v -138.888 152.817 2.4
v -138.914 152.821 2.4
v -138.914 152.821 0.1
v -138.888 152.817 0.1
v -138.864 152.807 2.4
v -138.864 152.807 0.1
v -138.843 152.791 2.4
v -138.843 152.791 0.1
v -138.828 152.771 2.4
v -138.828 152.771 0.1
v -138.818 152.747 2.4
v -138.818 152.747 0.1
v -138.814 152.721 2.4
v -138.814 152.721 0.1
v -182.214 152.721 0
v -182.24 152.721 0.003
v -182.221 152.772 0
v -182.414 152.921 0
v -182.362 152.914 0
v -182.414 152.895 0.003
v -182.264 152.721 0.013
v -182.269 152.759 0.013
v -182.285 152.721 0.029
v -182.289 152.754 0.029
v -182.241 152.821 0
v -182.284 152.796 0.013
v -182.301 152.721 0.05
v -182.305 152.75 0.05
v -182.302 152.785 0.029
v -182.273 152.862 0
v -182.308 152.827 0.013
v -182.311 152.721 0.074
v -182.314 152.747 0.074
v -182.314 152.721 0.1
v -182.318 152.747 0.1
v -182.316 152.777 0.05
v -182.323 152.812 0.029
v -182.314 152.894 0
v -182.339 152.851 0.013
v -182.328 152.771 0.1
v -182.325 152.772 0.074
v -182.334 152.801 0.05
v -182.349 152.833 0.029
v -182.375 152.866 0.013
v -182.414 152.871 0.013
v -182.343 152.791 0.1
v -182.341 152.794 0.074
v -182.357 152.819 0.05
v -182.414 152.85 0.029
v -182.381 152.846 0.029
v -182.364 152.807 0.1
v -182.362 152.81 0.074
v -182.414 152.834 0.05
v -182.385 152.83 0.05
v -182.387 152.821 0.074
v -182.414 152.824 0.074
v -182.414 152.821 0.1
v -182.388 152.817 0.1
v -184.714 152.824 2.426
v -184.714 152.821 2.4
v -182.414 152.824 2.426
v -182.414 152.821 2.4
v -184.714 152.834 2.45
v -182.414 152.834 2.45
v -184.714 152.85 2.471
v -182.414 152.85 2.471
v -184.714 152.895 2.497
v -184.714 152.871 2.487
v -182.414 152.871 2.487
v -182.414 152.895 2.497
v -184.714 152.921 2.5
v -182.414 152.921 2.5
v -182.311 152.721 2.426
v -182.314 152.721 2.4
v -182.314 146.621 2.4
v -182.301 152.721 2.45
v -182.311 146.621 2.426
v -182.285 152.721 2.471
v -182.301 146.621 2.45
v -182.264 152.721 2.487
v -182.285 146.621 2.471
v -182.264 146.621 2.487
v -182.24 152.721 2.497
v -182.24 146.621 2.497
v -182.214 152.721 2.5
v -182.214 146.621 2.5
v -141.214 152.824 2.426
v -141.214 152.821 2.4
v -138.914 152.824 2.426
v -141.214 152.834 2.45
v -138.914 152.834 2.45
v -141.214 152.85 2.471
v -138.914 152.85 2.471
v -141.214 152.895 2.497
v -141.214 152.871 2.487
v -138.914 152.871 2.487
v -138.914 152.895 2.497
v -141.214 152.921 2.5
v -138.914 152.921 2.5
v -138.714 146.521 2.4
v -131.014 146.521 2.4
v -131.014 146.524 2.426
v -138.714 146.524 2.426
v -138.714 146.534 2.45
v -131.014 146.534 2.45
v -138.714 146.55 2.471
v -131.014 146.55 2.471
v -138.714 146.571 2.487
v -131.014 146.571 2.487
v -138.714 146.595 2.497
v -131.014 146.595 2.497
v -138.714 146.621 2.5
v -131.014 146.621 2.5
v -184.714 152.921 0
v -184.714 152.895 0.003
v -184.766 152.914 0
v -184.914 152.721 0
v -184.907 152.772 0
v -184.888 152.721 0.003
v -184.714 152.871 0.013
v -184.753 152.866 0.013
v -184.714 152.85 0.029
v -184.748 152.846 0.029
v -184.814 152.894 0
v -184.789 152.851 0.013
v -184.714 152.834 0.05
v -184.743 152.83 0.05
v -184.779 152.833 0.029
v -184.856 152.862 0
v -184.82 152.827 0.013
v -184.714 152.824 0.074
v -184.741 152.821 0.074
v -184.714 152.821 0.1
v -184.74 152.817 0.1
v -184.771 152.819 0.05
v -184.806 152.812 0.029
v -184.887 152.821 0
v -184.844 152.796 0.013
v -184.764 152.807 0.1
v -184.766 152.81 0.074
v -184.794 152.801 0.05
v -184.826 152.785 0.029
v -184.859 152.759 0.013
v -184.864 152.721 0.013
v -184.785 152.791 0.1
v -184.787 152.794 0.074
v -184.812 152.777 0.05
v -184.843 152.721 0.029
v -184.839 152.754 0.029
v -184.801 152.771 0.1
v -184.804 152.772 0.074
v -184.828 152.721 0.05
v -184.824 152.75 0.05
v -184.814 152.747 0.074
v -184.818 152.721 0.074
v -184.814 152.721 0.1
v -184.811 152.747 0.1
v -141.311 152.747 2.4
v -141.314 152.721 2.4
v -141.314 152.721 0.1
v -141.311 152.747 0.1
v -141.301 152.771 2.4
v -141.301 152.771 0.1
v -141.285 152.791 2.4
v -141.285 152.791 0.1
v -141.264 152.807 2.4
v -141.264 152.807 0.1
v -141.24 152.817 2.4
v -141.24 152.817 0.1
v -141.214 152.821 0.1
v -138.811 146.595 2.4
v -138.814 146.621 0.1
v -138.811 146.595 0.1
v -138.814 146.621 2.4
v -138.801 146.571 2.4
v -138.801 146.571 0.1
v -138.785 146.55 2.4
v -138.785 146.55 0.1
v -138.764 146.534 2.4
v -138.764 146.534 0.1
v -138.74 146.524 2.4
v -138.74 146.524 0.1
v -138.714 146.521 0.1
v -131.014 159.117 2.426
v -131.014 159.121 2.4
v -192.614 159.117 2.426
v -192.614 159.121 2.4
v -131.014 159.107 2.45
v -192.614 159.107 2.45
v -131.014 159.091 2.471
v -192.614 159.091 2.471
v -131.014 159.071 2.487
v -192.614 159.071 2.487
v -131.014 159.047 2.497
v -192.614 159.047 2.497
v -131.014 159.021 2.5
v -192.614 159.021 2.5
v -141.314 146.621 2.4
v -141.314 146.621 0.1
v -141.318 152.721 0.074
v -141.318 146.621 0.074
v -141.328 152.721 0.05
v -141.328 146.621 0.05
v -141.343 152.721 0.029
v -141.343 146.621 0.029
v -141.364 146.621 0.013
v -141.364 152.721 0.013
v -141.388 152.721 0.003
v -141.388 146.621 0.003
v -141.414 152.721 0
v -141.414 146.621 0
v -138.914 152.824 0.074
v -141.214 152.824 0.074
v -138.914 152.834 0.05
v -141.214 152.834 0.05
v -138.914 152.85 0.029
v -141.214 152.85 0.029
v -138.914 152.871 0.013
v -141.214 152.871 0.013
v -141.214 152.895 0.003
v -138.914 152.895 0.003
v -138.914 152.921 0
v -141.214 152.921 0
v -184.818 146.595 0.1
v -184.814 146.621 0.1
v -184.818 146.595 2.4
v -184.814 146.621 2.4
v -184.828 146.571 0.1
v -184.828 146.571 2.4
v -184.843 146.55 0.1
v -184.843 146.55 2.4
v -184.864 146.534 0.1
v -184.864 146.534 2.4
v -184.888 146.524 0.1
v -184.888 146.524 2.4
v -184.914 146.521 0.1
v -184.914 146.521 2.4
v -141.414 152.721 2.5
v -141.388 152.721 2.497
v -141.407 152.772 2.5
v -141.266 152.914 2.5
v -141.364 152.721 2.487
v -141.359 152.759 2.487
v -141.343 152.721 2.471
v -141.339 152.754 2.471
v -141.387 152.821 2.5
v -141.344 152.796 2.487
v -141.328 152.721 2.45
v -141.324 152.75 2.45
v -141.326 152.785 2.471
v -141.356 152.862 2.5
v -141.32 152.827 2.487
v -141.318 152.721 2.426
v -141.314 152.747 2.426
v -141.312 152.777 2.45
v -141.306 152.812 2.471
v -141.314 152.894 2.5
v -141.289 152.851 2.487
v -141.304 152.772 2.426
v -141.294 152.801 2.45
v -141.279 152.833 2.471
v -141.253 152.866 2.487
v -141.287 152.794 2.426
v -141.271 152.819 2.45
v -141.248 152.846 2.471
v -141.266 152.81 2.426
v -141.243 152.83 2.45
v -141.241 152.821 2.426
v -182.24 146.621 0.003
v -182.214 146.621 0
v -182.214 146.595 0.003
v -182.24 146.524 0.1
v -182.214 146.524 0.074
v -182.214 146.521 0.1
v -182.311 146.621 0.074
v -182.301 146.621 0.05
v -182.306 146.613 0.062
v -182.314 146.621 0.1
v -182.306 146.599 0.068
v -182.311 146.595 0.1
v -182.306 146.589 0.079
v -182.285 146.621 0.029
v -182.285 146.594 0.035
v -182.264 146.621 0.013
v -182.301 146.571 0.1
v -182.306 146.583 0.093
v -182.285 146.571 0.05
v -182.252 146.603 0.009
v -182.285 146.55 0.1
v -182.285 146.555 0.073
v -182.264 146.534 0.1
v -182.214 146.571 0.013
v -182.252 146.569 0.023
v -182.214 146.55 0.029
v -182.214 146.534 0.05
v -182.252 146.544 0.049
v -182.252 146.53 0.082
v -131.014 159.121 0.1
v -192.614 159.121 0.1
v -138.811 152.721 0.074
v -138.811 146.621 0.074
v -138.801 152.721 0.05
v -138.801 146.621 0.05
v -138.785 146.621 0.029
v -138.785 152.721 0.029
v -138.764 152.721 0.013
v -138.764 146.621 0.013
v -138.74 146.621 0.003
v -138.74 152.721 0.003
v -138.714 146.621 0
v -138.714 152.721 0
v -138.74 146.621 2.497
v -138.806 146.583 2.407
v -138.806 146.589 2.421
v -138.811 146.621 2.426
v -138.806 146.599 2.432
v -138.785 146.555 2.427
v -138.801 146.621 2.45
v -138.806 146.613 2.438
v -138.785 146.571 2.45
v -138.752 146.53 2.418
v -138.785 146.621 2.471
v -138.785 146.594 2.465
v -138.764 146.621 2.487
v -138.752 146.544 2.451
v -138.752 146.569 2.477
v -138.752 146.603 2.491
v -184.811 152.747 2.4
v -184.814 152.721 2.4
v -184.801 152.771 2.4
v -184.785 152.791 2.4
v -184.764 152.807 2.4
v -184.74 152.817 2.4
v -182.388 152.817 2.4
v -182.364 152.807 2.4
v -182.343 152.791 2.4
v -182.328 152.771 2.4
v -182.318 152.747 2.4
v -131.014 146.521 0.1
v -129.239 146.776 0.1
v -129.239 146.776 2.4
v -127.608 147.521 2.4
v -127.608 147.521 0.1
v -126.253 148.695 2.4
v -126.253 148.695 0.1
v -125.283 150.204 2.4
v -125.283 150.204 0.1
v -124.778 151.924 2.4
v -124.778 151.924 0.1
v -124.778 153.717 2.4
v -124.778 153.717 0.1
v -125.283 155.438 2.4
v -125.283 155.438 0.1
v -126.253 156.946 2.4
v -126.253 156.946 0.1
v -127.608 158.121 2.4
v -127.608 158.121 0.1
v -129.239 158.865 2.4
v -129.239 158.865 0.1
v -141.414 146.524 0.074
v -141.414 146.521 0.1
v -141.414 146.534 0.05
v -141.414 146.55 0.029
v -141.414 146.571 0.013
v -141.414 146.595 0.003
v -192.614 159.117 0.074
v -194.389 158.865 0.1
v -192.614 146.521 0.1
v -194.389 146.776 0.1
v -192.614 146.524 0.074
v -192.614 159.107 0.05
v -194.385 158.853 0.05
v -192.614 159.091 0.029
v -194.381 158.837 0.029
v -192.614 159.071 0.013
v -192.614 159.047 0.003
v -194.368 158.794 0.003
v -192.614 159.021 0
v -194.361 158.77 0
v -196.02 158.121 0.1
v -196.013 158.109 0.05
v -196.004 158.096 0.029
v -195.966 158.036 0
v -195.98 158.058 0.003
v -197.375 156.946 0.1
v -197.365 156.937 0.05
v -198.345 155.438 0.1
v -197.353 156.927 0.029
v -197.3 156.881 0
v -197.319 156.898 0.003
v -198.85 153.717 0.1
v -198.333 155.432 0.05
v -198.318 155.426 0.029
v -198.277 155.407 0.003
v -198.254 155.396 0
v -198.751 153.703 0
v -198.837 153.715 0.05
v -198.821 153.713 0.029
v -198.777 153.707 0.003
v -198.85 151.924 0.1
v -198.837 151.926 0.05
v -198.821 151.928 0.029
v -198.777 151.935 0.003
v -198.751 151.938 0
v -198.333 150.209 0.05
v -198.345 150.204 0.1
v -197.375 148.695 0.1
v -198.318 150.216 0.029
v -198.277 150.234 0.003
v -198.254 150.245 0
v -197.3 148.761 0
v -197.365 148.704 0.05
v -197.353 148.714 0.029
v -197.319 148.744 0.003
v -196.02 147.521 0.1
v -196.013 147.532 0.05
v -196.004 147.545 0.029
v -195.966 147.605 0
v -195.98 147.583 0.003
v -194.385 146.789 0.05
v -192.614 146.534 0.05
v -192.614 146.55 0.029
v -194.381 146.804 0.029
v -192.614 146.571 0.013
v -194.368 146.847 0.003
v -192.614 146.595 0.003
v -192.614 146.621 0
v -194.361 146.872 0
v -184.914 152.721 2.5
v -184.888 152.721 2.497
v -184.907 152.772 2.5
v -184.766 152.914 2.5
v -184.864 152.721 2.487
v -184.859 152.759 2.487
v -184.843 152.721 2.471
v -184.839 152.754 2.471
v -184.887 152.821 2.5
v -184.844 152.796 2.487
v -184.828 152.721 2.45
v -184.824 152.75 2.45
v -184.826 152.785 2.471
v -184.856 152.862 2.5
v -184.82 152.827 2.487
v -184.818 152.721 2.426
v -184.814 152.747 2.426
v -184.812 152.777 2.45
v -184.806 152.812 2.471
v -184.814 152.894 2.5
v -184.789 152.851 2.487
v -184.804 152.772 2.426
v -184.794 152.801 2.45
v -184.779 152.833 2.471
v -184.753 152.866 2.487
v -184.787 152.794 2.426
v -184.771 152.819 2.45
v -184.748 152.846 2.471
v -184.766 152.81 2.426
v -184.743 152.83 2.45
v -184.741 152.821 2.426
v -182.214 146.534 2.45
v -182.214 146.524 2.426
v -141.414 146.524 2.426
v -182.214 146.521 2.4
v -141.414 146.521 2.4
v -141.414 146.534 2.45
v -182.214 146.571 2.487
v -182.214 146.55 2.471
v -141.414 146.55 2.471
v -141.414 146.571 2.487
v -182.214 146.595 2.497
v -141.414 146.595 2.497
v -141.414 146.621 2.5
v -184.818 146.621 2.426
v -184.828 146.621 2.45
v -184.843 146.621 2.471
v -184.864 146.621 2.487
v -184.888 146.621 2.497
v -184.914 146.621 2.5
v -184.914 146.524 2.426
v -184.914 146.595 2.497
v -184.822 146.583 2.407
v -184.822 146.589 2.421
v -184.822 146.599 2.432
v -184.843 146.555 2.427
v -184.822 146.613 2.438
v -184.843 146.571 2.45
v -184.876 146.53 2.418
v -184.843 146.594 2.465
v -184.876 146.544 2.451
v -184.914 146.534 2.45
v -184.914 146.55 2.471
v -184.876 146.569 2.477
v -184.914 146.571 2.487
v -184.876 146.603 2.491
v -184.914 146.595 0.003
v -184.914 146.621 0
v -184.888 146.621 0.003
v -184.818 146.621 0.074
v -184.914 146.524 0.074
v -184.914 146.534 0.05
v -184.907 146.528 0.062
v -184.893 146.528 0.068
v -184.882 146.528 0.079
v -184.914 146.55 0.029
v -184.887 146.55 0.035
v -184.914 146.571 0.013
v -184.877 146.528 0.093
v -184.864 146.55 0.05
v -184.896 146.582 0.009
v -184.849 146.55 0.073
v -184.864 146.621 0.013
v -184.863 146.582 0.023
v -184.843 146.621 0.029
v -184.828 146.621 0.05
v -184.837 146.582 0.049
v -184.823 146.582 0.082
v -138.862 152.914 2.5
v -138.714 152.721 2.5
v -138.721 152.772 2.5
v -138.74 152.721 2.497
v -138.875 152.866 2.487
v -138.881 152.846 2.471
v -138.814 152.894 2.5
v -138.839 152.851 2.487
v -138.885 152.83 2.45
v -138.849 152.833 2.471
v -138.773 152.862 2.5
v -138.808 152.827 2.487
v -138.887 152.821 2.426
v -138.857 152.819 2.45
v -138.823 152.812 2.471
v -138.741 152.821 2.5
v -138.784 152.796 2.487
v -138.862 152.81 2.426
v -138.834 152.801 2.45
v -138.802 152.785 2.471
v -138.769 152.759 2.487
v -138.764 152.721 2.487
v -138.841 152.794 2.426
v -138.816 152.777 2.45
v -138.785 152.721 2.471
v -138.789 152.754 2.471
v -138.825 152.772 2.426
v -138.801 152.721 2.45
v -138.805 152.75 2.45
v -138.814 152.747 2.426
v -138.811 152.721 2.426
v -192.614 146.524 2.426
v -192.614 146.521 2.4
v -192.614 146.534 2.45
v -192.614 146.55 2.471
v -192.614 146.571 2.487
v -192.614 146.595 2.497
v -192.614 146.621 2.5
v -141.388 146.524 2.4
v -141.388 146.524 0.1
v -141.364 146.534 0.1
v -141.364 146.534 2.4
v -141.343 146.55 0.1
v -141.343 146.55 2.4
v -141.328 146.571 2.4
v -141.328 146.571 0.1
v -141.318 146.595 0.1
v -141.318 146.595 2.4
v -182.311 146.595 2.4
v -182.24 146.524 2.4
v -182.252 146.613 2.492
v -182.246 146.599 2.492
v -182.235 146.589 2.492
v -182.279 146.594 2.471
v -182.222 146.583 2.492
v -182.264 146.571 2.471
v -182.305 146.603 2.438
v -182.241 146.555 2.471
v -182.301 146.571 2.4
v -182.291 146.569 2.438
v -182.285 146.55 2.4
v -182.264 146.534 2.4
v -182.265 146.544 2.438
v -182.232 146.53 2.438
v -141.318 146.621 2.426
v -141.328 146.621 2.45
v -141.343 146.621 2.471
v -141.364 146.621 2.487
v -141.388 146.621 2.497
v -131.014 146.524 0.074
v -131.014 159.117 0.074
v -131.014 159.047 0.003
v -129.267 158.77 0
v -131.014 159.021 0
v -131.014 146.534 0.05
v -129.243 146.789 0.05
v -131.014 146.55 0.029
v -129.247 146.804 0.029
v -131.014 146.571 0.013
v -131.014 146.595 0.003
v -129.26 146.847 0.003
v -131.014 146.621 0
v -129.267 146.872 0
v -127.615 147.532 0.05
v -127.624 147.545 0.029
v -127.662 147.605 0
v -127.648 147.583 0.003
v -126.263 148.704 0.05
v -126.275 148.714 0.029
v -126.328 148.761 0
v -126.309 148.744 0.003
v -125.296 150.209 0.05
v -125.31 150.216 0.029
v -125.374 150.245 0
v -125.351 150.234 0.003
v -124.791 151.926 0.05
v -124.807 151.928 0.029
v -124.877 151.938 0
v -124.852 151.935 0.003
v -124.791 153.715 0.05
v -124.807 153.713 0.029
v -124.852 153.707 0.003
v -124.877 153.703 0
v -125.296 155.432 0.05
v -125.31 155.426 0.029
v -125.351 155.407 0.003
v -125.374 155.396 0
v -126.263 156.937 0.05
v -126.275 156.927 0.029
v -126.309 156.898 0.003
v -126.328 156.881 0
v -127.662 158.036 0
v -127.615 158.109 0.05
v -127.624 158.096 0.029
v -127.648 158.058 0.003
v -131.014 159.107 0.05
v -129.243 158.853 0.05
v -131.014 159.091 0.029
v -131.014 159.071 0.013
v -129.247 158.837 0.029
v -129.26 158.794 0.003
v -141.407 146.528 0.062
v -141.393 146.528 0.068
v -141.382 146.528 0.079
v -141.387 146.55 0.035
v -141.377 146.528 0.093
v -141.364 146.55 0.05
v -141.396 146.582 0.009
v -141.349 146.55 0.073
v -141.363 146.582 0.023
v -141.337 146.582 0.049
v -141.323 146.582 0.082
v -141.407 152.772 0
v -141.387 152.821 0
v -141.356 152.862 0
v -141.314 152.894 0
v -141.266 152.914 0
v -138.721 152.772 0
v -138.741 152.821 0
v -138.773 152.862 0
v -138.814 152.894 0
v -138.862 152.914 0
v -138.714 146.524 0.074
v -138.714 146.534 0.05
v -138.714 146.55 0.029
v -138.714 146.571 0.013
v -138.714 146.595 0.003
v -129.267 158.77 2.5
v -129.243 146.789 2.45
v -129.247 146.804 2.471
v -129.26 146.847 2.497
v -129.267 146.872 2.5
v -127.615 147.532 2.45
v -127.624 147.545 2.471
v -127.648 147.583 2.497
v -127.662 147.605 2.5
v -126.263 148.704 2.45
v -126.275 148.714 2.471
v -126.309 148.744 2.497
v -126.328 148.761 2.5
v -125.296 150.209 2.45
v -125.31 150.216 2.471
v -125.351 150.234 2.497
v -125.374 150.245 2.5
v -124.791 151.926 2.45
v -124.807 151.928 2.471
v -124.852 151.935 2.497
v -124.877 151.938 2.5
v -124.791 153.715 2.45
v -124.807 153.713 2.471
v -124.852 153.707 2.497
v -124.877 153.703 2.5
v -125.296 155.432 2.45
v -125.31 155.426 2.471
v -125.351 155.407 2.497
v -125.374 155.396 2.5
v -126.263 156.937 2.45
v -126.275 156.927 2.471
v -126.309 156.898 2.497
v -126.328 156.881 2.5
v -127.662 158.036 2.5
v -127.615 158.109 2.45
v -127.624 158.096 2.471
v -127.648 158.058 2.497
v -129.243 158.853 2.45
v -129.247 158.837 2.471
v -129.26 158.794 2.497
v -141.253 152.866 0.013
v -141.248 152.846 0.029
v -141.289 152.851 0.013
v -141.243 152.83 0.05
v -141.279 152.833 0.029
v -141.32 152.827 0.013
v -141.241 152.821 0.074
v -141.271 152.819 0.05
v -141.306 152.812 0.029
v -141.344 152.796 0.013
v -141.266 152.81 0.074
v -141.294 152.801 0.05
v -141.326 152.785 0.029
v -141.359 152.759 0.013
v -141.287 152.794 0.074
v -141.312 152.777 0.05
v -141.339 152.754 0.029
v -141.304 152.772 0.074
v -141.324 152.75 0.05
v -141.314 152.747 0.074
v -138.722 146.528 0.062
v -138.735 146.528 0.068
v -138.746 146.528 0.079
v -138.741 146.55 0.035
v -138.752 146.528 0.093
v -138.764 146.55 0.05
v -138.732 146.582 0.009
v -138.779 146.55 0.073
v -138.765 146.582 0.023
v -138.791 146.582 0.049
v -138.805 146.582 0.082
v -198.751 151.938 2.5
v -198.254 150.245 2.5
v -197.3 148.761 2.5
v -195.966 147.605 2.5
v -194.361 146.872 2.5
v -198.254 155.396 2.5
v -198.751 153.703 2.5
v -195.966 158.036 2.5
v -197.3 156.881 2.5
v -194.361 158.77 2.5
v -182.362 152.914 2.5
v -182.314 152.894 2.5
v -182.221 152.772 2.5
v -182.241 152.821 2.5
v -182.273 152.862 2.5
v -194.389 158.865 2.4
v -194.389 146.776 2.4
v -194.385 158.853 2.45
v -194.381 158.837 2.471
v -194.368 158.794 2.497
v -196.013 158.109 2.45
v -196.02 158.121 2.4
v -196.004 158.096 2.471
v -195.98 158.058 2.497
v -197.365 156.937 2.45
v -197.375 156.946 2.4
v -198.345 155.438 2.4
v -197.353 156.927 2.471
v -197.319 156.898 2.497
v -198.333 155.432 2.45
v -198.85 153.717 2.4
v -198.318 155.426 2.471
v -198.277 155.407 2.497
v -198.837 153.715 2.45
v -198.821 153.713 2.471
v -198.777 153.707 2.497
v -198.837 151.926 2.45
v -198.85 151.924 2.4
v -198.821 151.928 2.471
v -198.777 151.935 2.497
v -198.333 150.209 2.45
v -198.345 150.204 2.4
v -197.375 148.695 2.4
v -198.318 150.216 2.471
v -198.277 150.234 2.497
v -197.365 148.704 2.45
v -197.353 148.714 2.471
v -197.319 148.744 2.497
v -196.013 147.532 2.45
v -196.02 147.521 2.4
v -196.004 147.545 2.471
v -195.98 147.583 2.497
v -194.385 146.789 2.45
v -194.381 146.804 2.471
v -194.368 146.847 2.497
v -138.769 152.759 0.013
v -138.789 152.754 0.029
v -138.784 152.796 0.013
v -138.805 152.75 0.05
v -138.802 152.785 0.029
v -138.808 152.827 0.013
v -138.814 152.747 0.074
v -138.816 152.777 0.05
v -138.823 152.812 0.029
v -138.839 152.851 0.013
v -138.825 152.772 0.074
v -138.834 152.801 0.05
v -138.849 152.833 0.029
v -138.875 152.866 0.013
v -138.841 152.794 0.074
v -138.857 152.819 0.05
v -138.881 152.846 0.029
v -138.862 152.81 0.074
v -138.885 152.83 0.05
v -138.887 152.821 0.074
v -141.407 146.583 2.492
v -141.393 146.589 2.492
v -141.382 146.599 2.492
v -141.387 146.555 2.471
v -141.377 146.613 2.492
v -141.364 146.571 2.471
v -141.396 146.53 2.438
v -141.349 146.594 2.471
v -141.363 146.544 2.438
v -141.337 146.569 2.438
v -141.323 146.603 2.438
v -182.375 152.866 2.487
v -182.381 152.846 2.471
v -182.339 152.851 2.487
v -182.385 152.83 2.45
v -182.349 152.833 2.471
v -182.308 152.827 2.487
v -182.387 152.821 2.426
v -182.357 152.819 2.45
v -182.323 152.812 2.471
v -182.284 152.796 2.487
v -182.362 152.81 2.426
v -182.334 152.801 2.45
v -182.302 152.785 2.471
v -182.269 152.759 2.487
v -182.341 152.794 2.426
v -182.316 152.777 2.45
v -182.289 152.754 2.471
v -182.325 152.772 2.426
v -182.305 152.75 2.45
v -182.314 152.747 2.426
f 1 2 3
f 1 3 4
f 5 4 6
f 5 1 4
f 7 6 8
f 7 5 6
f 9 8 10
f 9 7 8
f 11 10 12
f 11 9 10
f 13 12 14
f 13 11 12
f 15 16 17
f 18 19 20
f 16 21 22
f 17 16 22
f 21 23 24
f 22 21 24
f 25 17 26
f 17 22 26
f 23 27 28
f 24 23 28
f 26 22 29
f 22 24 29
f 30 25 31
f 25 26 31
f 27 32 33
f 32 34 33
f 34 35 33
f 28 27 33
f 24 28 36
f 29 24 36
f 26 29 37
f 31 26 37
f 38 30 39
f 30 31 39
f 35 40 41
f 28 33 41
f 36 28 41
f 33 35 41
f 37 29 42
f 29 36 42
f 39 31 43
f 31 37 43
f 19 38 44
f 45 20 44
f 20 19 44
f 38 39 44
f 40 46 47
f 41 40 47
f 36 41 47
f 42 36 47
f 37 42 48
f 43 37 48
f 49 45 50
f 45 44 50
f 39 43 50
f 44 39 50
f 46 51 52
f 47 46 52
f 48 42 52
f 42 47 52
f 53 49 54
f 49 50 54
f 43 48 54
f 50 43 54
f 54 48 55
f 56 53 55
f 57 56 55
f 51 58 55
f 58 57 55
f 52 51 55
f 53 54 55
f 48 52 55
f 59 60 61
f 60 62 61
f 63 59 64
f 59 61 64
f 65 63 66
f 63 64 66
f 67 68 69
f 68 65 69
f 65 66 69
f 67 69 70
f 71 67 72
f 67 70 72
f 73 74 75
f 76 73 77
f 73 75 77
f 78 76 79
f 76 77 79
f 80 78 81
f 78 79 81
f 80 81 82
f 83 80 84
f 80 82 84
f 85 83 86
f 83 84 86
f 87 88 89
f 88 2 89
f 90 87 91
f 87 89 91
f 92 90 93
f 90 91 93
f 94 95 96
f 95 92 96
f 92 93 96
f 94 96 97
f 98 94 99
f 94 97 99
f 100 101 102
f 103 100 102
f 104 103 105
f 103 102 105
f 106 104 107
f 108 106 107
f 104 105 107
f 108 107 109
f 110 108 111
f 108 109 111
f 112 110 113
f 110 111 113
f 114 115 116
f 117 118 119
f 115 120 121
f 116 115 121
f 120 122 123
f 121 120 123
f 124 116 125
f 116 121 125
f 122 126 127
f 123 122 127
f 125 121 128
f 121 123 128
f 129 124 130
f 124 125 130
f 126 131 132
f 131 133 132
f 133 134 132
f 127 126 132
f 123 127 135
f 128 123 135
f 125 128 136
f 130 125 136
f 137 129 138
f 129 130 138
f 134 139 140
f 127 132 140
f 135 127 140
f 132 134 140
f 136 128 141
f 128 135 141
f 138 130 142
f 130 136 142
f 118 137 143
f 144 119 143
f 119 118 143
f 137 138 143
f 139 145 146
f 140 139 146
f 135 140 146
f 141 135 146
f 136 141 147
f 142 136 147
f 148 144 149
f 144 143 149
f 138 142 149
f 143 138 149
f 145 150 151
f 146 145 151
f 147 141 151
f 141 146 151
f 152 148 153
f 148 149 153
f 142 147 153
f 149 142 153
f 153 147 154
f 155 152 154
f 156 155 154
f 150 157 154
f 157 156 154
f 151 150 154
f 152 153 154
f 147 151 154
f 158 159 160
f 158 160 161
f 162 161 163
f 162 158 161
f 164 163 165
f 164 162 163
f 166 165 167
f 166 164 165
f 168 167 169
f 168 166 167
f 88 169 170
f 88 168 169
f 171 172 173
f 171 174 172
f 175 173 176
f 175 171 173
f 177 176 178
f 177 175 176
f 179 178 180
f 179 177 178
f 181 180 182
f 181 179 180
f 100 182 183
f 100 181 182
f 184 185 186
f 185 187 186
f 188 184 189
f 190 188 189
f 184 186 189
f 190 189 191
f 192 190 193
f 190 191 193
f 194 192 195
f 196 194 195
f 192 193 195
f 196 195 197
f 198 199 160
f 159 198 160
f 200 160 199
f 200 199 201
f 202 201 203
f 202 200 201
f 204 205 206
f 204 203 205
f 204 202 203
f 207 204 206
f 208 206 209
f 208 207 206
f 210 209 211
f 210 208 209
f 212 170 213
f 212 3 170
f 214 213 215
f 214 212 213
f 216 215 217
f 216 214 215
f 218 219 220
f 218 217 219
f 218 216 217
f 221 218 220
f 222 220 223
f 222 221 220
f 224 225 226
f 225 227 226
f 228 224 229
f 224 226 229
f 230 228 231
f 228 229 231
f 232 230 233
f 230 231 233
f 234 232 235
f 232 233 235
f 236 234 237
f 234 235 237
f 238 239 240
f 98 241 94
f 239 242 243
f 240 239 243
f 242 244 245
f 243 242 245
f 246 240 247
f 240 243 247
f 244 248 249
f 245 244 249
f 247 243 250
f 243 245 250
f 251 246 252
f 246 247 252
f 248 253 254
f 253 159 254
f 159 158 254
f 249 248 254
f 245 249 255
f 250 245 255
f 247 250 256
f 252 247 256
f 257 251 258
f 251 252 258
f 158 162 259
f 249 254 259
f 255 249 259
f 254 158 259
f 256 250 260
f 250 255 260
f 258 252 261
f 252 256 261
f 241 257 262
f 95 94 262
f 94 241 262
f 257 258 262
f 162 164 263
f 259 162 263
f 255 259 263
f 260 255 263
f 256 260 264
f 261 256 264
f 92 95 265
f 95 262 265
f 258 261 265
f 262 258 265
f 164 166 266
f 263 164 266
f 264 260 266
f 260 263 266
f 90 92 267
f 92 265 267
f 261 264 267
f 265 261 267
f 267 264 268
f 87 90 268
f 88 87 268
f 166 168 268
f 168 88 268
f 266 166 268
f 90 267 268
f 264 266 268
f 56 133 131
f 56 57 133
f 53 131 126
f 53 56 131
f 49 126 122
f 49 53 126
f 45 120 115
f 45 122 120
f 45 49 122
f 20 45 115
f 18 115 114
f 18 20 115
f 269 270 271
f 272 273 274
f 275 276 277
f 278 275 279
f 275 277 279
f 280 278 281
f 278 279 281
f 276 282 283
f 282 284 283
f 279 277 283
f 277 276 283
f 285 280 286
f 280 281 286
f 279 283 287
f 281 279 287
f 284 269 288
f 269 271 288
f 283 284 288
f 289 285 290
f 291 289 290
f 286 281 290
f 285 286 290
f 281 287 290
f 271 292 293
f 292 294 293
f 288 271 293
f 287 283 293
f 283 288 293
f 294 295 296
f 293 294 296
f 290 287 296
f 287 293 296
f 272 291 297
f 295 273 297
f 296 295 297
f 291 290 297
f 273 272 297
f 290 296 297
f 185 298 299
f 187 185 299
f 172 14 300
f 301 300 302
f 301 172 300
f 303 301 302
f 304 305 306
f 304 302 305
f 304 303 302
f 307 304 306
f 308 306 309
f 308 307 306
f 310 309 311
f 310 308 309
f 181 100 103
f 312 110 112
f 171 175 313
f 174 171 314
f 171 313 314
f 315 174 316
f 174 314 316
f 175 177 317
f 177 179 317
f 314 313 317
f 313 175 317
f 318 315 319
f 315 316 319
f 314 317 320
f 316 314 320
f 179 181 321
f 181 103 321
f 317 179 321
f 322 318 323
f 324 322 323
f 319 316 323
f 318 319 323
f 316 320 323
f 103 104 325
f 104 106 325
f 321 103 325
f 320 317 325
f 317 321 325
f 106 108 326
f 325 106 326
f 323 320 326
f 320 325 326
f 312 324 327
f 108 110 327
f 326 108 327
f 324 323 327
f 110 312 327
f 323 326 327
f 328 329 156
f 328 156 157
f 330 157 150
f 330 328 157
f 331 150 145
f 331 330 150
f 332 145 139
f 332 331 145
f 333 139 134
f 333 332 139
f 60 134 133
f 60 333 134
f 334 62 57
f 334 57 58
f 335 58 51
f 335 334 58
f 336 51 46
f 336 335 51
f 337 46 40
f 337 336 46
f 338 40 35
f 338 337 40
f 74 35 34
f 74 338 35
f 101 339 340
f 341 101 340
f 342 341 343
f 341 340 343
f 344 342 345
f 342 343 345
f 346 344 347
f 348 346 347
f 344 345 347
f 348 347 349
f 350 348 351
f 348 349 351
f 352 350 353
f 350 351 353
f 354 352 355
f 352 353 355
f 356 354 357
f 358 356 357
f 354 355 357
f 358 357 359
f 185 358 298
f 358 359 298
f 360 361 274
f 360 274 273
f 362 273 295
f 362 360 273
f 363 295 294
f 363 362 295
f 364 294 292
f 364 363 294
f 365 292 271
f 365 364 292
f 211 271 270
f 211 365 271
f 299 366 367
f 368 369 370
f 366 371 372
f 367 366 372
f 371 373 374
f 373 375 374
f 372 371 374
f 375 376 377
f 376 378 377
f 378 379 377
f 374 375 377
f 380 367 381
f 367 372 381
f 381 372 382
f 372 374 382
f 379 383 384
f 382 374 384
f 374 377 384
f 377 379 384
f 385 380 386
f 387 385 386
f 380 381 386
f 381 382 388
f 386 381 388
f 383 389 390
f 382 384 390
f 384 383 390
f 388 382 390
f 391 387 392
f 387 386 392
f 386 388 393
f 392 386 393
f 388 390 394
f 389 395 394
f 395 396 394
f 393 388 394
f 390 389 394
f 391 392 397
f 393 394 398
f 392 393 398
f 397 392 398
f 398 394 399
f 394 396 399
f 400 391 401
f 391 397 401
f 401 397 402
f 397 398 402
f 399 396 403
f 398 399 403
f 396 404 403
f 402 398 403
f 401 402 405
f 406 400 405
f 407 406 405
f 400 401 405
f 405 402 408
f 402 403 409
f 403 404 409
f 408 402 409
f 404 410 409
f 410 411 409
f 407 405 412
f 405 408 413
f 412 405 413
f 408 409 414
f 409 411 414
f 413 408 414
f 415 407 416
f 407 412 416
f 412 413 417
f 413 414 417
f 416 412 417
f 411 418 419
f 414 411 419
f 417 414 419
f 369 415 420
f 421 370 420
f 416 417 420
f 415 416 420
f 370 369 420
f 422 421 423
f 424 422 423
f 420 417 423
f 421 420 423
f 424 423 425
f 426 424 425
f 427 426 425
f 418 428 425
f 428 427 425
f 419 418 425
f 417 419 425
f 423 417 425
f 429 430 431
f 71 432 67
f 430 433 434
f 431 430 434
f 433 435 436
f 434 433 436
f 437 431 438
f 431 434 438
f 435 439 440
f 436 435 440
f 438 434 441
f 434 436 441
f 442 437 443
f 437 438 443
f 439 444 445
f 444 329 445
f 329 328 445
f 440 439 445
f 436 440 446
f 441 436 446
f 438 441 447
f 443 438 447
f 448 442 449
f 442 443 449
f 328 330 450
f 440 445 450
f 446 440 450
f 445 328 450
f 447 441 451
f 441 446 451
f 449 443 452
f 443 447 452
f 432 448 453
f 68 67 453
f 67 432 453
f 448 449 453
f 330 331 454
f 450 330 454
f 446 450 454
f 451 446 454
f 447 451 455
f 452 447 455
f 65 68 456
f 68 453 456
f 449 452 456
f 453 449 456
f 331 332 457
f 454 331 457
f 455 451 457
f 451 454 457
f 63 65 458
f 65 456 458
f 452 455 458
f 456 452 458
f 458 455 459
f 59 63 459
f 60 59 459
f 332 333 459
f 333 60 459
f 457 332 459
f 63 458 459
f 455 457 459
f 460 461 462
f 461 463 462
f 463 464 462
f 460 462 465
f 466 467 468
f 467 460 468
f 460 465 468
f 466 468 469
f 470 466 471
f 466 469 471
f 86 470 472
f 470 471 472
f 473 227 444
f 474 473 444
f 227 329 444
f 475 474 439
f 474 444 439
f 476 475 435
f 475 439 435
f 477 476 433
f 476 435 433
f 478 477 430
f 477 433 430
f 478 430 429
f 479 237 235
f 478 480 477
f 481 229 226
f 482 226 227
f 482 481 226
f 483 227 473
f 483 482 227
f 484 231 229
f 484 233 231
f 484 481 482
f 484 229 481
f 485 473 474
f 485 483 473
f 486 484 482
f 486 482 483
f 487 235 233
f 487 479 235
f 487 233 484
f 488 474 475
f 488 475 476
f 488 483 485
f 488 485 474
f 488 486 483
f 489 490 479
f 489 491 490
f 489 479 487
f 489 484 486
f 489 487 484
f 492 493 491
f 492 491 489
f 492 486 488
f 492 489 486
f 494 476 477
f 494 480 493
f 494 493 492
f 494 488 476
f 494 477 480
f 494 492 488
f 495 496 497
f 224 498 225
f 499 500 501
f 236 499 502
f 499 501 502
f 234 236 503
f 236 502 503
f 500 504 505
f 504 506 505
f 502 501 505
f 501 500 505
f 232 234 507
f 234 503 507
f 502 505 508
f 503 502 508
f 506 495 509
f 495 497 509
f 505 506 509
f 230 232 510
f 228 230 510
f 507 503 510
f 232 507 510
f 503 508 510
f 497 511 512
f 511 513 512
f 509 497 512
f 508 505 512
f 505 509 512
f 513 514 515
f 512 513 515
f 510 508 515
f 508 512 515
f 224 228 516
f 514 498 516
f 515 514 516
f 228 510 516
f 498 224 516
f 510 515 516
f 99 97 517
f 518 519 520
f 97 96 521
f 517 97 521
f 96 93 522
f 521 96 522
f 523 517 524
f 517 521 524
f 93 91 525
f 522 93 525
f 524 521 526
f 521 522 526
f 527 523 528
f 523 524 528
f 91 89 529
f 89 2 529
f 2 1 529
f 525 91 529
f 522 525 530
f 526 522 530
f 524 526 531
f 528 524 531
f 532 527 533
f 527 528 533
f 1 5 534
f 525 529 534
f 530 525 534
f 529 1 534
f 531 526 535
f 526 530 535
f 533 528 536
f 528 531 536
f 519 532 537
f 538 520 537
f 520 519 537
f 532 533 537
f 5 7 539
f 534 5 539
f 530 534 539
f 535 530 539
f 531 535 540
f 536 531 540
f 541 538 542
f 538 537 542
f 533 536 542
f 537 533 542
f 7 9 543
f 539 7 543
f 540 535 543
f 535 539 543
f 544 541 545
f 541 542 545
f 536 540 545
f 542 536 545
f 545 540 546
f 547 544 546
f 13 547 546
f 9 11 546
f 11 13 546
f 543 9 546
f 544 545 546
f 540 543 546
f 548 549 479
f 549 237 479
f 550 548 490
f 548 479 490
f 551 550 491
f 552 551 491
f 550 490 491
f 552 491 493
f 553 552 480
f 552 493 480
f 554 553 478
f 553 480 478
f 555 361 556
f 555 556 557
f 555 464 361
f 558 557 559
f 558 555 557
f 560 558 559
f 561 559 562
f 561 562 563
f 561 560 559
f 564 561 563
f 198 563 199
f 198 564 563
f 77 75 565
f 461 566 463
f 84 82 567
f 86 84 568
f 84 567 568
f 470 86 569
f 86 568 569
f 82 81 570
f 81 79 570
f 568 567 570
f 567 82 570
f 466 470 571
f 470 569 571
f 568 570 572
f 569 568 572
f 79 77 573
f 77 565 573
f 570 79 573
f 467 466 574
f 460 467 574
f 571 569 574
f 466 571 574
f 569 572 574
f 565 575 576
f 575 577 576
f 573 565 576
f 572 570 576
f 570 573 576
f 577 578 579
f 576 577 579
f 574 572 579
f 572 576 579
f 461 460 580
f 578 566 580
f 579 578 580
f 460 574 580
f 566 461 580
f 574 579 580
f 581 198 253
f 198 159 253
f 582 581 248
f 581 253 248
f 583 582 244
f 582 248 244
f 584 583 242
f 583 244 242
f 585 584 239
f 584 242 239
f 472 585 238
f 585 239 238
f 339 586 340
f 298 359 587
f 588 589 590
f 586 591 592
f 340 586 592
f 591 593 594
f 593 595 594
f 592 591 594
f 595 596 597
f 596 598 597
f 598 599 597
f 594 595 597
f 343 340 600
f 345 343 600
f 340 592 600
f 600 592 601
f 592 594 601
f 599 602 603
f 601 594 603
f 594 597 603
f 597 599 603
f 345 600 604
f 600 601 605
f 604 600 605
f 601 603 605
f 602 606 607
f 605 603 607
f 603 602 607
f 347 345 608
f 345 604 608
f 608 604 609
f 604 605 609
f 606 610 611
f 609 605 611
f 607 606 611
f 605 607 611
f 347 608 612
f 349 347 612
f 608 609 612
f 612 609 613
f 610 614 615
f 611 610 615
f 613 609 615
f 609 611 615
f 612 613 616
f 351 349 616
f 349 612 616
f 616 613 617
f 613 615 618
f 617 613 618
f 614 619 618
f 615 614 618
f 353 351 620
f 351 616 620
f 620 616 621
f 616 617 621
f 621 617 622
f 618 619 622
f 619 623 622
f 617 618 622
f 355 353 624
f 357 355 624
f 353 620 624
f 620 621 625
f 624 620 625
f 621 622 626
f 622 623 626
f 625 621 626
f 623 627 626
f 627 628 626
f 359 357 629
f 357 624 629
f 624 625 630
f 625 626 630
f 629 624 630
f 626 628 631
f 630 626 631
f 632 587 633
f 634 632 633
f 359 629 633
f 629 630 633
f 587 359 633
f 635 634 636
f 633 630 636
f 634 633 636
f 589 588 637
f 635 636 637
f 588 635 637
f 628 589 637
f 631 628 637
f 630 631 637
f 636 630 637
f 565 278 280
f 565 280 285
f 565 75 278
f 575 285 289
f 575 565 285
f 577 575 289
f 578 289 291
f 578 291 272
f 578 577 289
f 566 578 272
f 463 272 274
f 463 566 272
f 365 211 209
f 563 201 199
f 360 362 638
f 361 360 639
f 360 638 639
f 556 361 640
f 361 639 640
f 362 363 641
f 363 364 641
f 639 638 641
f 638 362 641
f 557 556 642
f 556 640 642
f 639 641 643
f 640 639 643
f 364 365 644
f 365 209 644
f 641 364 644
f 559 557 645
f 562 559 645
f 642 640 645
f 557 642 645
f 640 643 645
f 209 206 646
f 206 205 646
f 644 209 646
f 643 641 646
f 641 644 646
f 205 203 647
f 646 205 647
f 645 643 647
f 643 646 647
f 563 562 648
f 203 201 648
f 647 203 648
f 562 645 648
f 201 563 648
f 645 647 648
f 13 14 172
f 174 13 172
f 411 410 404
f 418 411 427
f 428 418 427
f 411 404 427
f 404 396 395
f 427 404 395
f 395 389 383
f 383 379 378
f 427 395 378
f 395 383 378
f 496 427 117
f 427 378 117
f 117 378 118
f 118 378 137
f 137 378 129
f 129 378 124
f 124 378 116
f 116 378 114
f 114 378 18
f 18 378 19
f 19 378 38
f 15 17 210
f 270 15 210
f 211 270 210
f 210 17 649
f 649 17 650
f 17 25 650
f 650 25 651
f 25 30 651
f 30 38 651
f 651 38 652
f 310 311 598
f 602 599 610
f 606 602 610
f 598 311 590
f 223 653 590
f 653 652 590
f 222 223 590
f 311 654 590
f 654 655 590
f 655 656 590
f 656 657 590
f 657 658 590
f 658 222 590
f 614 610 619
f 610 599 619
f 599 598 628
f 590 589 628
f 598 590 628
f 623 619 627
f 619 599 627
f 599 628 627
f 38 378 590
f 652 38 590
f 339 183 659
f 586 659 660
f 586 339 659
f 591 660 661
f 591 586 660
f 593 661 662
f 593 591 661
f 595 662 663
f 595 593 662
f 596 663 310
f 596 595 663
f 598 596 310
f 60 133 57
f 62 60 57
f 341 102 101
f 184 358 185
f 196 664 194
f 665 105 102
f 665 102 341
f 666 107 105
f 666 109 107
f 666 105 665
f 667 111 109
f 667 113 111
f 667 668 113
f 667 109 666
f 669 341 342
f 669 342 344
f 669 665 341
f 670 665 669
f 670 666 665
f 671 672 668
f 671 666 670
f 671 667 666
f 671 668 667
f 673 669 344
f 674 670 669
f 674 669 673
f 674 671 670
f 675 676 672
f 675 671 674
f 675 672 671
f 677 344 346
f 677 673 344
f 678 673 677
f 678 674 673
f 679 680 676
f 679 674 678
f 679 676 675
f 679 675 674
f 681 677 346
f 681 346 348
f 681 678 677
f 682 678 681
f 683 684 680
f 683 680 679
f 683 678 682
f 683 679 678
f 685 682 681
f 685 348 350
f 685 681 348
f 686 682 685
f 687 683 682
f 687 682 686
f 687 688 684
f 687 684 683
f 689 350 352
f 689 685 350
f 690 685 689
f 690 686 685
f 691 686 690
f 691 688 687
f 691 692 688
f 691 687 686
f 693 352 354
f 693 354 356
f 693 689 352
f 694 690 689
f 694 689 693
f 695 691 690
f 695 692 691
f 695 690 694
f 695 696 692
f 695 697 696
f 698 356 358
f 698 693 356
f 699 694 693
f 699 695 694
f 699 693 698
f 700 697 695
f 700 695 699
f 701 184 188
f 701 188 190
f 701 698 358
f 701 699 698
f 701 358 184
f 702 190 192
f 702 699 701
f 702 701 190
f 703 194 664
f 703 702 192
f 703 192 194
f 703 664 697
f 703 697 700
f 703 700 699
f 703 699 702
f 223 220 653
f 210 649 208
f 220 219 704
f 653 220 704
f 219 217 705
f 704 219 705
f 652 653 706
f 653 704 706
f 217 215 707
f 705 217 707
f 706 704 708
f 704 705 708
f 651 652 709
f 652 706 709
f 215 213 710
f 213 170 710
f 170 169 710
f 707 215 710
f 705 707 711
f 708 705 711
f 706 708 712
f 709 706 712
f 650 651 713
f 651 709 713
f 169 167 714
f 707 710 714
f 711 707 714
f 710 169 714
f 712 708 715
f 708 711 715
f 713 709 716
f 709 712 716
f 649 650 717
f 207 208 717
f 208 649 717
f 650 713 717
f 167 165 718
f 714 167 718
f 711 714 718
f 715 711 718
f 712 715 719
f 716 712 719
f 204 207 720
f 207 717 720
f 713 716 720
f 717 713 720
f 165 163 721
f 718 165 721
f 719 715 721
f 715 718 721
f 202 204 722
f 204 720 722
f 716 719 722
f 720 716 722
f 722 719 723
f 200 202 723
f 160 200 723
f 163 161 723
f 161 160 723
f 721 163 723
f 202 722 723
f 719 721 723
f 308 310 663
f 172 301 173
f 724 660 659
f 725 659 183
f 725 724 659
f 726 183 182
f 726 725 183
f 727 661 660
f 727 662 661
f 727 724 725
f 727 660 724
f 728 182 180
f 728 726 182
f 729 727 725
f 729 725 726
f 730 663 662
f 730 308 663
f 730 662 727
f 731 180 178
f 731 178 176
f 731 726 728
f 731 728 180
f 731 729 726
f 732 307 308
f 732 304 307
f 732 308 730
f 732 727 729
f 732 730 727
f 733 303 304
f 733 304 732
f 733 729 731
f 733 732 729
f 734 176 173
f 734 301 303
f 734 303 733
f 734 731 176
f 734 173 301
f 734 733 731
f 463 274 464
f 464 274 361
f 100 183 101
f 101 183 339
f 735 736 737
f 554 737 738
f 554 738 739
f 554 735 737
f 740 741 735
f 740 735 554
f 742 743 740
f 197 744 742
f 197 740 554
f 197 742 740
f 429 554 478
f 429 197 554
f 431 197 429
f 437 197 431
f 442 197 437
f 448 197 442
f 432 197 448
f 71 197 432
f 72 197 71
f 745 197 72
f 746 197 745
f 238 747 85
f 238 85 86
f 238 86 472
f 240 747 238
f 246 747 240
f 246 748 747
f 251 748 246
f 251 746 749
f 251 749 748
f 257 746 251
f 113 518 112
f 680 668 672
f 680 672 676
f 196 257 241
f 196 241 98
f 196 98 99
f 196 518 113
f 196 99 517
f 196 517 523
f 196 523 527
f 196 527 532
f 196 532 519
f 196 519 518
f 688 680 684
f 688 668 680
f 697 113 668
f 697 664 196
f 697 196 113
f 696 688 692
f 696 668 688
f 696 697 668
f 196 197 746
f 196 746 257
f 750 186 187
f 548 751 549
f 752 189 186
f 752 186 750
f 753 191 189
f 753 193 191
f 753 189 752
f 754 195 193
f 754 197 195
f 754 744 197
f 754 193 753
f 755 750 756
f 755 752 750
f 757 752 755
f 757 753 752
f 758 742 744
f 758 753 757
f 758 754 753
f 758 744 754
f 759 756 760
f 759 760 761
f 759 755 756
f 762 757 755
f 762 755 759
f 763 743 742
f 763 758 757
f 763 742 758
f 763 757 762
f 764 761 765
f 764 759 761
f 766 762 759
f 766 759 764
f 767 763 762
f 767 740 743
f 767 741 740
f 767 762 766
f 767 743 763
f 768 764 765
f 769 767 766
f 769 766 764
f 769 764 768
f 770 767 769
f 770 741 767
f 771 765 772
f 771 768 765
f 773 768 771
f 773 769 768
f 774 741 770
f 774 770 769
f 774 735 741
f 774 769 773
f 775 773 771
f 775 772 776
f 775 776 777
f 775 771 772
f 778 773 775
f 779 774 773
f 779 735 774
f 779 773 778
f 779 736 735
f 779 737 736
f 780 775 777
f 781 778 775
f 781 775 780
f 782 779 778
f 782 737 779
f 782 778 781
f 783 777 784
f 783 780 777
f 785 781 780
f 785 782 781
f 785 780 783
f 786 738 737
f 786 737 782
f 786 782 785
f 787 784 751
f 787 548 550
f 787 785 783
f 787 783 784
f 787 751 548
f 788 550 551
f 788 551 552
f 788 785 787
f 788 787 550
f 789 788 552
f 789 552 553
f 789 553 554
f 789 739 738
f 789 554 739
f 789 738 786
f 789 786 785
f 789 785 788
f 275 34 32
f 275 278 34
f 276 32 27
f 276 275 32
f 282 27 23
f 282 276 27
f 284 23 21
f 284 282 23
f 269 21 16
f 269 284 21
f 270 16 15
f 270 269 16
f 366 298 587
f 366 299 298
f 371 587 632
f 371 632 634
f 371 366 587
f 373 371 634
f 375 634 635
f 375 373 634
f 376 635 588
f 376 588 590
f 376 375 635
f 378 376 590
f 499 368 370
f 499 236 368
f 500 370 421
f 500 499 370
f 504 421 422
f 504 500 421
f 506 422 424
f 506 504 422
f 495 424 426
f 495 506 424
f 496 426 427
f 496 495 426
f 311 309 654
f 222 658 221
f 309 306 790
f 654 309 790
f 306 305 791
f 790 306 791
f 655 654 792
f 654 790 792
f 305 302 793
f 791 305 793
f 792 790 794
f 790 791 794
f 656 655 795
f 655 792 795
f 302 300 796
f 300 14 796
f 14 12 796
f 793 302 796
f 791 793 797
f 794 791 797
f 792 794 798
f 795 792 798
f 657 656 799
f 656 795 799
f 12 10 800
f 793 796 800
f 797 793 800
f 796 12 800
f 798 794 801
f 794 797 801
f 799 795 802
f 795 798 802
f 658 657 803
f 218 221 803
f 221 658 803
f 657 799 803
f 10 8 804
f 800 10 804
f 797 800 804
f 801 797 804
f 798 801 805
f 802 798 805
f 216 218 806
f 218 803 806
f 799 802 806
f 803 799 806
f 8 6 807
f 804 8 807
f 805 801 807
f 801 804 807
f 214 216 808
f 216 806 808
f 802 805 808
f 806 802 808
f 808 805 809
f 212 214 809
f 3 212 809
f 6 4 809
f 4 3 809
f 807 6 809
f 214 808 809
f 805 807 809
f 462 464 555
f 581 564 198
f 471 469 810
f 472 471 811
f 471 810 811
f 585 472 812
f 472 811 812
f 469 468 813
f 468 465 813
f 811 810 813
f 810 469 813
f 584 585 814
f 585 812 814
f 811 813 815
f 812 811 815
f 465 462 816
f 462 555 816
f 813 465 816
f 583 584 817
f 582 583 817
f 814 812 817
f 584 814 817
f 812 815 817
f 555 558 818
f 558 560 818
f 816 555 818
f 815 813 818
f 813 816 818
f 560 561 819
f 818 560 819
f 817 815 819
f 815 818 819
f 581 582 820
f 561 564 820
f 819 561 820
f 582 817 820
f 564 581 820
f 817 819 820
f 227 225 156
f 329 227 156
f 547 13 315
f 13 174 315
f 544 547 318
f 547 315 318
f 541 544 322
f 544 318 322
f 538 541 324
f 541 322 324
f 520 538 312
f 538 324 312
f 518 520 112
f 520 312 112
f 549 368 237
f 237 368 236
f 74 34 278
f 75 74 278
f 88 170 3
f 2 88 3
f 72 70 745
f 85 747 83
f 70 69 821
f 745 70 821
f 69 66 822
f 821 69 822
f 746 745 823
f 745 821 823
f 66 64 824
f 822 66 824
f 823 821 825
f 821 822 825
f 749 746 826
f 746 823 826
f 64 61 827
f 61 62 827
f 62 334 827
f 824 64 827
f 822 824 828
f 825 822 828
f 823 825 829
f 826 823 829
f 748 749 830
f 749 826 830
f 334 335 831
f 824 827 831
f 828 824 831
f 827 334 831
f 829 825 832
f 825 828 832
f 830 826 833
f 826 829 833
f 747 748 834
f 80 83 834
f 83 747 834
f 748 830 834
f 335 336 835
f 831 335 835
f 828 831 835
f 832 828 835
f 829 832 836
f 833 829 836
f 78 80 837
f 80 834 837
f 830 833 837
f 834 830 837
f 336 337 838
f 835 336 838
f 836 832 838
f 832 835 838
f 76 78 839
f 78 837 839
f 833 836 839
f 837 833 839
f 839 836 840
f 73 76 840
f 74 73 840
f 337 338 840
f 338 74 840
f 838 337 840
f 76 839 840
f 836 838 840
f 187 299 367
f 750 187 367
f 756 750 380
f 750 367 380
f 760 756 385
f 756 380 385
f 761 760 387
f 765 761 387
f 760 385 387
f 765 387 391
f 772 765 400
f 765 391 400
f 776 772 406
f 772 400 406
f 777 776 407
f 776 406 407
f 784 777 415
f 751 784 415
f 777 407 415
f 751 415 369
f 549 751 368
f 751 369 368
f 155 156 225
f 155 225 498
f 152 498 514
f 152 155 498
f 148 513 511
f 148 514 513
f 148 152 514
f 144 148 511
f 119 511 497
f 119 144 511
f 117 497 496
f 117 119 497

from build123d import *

# Parameters (mm, degrees)
RESSALTO_EXTRUS_O1_DEPTH = 2.5
FILETE1_R                = 0.1


with BuildPart() as part:
    # Esboço1 → Ressalto-extrusão1 (new body)
    with BuildSketch(Plane.XY):
        with BuildLine():
            Line((-184.814110363, 146.520645343), (-184.814110363, 152.820645343))
            Line((-184.814110363, 152.820645343), (-182.314110363, 152.820645343))
            Line((-182.314110363, 152.820645343), (-182.314110363, 146.520645343))
            Line((-182.314110363, 146.520645343), (-141.314110363, 146.520645343))
            Line((-141.314110363, 146.520645343), (-141.314110363, 152.820645343))
            Line((-141.314110363, 152.820645343), (-138.814110363, 152.820645343))
            Line((-138.814110363, 152.820645343), (-138.814110363, 146.520645343))
            Line((-138.814110363, 146.520645343), (-131.014110363, 146.520645343))
            ThreePointArc((-131.014110363, 146.520645343), (-124.714110363, 152.820645343), (-131.014110363, 159.120645343))
            Line((-131.014110363, 159.120645343), (-192.614110363, 159.120645343))
            ThreePointArc((-192.614110363, 159.120645343), (-198.914110363, 152.820645343), (-192.614110363, 146.520645343))
            Line((-192.614110363, 146.520645343), (-184.814110363, 146.520645343))
        make_face()
    extrude(amount=RESSALTO_EXTRUS_O1_DEPTH)

    # Filete1
    filete1_edges = [part.edges().sort_by_distance(p)[0] for p in [
        (-124.714110363, 152.820645343, 2.5),
        (-138.814110363, 149.670645343, 0),
        (-140.064110363, 152.820645343, 0),
        (-141.314110363, 149.670645343, 0),
        (-161.814110363, 159.120645343, 2.5),
        (-161.814110363, 146.520645343, 0),
        (-182.314110363, 149.670645343, 0),
        (-183.564110363, 152.820645343, 0),
        (-184.814110363, 149.670645343, 0),
        (-188.714110363, 146.520645343, 0),
        (-198.914110363, 152.820645343, 0),
        (-161.814110363, 159.120645343, 0),
        (-124.714110363, 152.820645343, 0),
        (-198.914110363, 152.820645343, 2.5),
        (-134.914110363, 146.520645343, 0),
        (-138.814110363, 146.520645343, 1.25),
        (-138.814110363, 152.820645343, 1.25),
        (-141.314110363, 152.820645343, 1.25),
        (-141.314110363, 146.520645343, 1.25),
        (-182.314110363, 146.520645343, 1.25),
        (-182.314110363, 152.820645343, 1.25),
        (-184.814110363, 152.820645343, 1.25),
        (-184.814110363, 146.520645343, 1.25),
        (-188.714110363, 146.520645343, 2.5),
        (-184.814110363, 149.670645343, 2.5),
        (-183.564110363, 152.820645343, 2.5),
        (-182.314110363, 149.670645343, 2.5),
        (-161.814110363, 146.520645343, 2.5),
        (-141.314110363, 149.670645343, 2.5),
        (-134.914110363, 146.520645343, 2.5),
        (-140.064110363, 152.820645343, 2.5),
        (-138.814110363, 149.670645343, 2.5),
    ]]
    fillet(filete1_edges, radius=FILETE1_R)


solid = part.part
